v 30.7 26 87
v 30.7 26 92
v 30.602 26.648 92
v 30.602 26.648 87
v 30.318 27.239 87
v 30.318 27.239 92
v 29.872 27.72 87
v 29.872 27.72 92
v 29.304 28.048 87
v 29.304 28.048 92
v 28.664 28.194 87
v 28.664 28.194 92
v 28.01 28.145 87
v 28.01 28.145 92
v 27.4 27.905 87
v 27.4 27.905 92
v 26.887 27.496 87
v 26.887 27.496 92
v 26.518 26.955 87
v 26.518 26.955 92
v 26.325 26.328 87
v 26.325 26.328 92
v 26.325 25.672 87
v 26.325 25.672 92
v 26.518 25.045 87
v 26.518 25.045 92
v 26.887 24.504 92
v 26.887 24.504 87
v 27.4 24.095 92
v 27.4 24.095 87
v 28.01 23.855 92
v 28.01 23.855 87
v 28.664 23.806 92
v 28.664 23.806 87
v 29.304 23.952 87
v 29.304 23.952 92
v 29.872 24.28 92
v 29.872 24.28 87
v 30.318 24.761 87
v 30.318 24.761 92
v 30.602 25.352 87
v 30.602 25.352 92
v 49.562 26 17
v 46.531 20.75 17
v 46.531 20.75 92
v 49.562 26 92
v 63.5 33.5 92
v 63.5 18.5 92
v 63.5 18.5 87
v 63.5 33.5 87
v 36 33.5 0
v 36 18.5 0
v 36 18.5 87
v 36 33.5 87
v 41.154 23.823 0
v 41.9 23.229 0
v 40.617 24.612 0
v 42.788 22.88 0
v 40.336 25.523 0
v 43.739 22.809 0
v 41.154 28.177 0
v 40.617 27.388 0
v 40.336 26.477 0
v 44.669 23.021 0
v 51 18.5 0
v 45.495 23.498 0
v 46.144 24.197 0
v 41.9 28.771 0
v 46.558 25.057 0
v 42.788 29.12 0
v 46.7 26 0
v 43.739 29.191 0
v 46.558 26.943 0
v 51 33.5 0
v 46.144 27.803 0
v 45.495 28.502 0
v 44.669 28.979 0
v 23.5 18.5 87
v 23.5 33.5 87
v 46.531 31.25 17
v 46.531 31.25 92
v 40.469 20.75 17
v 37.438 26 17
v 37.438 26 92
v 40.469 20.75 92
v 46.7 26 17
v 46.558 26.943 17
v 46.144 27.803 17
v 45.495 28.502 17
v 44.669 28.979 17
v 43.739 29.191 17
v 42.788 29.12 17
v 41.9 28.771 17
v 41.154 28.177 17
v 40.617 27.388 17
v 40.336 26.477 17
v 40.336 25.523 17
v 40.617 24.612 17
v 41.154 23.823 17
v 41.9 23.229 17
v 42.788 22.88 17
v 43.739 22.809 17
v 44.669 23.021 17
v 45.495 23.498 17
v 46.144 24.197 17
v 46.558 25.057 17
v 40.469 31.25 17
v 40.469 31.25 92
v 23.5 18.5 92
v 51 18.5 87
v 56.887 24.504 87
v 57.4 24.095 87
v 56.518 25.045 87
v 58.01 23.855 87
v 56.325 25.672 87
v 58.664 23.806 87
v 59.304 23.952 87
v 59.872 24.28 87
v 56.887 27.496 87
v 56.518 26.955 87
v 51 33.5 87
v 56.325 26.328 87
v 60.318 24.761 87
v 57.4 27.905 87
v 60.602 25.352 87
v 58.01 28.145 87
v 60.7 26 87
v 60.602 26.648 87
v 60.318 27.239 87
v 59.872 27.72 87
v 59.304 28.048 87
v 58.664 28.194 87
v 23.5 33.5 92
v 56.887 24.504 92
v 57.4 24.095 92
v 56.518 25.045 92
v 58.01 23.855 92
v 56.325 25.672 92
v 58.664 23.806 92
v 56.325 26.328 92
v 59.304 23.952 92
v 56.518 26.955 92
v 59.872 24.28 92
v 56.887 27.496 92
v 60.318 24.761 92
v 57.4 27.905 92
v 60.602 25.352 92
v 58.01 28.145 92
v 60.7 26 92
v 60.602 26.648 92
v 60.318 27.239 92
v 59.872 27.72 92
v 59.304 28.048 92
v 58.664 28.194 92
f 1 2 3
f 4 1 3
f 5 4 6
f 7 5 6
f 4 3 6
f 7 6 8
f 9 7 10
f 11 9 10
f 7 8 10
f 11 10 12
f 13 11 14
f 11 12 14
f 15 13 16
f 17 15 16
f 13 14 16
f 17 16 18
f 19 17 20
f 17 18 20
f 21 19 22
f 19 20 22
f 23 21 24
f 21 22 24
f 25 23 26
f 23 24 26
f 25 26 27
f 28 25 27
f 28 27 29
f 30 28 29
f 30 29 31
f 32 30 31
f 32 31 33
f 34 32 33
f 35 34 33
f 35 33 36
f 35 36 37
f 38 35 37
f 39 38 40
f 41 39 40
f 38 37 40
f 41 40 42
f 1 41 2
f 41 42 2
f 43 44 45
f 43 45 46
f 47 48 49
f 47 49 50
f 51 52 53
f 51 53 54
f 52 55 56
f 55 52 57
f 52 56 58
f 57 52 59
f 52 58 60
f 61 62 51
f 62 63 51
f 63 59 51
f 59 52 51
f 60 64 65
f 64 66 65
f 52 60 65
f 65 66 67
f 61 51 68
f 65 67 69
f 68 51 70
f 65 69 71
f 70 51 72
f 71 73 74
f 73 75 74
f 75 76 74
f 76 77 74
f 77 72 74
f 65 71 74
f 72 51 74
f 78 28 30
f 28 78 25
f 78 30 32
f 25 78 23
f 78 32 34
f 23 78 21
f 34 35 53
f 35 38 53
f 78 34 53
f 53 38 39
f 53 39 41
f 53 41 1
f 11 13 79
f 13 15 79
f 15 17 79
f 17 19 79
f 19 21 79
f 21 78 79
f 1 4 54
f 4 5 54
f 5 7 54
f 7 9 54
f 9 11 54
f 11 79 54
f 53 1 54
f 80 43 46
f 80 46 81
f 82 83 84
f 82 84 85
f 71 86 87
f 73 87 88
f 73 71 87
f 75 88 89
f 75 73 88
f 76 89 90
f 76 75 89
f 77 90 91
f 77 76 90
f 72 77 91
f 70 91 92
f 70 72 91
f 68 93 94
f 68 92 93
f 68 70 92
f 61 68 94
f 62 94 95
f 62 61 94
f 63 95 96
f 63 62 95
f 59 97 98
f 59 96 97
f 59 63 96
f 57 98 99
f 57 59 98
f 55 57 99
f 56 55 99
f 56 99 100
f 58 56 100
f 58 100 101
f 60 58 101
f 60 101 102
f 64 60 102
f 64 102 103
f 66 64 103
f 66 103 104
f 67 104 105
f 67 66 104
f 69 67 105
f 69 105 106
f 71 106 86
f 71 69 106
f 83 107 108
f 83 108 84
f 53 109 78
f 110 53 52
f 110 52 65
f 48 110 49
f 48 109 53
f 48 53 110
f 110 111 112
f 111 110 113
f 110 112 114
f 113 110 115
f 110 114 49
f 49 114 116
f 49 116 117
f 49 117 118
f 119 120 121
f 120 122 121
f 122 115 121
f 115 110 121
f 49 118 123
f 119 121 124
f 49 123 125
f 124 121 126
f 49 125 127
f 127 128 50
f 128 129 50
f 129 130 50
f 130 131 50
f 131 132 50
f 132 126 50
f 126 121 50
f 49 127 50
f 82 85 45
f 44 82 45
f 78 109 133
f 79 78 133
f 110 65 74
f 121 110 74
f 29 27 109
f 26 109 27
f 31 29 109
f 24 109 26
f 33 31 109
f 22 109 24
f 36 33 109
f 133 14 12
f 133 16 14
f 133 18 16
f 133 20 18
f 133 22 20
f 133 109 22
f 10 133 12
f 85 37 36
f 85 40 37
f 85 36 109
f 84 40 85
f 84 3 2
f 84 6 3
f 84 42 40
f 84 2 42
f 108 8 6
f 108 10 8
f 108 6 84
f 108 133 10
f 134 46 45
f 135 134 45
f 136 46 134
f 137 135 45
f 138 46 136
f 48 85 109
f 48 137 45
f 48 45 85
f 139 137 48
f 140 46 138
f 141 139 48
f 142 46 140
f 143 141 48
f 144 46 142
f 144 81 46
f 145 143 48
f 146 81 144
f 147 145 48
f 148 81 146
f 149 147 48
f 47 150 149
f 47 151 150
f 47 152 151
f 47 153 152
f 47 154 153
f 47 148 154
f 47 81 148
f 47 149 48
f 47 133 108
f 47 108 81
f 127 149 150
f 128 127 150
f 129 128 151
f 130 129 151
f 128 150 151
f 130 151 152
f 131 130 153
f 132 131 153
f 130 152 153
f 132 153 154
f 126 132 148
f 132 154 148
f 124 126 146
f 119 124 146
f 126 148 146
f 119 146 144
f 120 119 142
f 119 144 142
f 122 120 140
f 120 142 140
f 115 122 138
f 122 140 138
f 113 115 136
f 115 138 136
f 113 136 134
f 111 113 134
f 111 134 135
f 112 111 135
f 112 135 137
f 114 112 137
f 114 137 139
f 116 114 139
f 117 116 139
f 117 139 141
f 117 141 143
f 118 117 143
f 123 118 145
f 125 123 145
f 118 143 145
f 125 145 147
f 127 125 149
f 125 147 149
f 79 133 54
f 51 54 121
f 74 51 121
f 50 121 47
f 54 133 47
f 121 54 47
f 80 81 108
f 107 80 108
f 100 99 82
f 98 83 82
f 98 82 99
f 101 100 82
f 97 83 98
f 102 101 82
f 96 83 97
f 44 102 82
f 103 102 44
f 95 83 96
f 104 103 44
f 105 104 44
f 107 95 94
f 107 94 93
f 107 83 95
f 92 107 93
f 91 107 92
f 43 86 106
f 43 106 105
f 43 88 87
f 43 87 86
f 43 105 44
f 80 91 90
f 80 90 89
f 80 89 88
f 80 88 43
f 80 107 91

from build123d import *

# Parameters (mm, degrees)
SKETCH1_W           = 15
SKETCH1_H           = 15
SKETCH1_R           = 3.2
BOSS_EXTRUDE1_DEPTH = 92
SKETCH4_W           = 40
SKETCH4_H           = 15
SKETCH4_R           = 2.2
BOSS_EXTRUDE2_DEPTH = 5
CUT_EXTRUDE1_DEPTH  = 75


with BuildPart() as part:
    # Sketch1 → Boss-Extrude1 (new body)
    with BuildSketch(Plane.XY):
        with Locations((43.5, 26)):
            Rectangle(SKETCH1_W, SKETCH1_H)
        with Locations((43.5, 26)):
            Circle(SKETCH1_R, mode=Mode.SUBTRACT)
    extrude(amount=BOSS_EXTRUDE1_DEPTH)

    # Sketch4 → Boss-Extrude2 (add)
    with BuildSketch(Plane.XY.offset(92)):
        with Locations((43.5, 26)):
            Rectangle(SKETCH4_W, SKETCH4_H)
        with Locations((58.5, 26)):
            Circle(SKETCH4_R, mode=Mode.SUBTRACT)
        with Locations((28.5, 26)):
            Circle(SKETCH4_R, mode=Mode.SUBTRACT)
    extrude(amount=-BOSS_EXTRUDE2_DEPTH)

    # Sketch3 → Cut-Extrude1 (cut)
    with BuildSketch(Plane.XY.offset(92)):
        Polygon((40.468911087, 20.75), (46.531088913, 20.75), (49.562177826, 26), (46.531088913, 31.25), (40.468911087, 31.25), (37.437822174, 26), align=None)
    extrude(amount=-CUT_EXTRUDE1_DEPTH, mode=Mode.SUBTRACT)


solid = part.part
